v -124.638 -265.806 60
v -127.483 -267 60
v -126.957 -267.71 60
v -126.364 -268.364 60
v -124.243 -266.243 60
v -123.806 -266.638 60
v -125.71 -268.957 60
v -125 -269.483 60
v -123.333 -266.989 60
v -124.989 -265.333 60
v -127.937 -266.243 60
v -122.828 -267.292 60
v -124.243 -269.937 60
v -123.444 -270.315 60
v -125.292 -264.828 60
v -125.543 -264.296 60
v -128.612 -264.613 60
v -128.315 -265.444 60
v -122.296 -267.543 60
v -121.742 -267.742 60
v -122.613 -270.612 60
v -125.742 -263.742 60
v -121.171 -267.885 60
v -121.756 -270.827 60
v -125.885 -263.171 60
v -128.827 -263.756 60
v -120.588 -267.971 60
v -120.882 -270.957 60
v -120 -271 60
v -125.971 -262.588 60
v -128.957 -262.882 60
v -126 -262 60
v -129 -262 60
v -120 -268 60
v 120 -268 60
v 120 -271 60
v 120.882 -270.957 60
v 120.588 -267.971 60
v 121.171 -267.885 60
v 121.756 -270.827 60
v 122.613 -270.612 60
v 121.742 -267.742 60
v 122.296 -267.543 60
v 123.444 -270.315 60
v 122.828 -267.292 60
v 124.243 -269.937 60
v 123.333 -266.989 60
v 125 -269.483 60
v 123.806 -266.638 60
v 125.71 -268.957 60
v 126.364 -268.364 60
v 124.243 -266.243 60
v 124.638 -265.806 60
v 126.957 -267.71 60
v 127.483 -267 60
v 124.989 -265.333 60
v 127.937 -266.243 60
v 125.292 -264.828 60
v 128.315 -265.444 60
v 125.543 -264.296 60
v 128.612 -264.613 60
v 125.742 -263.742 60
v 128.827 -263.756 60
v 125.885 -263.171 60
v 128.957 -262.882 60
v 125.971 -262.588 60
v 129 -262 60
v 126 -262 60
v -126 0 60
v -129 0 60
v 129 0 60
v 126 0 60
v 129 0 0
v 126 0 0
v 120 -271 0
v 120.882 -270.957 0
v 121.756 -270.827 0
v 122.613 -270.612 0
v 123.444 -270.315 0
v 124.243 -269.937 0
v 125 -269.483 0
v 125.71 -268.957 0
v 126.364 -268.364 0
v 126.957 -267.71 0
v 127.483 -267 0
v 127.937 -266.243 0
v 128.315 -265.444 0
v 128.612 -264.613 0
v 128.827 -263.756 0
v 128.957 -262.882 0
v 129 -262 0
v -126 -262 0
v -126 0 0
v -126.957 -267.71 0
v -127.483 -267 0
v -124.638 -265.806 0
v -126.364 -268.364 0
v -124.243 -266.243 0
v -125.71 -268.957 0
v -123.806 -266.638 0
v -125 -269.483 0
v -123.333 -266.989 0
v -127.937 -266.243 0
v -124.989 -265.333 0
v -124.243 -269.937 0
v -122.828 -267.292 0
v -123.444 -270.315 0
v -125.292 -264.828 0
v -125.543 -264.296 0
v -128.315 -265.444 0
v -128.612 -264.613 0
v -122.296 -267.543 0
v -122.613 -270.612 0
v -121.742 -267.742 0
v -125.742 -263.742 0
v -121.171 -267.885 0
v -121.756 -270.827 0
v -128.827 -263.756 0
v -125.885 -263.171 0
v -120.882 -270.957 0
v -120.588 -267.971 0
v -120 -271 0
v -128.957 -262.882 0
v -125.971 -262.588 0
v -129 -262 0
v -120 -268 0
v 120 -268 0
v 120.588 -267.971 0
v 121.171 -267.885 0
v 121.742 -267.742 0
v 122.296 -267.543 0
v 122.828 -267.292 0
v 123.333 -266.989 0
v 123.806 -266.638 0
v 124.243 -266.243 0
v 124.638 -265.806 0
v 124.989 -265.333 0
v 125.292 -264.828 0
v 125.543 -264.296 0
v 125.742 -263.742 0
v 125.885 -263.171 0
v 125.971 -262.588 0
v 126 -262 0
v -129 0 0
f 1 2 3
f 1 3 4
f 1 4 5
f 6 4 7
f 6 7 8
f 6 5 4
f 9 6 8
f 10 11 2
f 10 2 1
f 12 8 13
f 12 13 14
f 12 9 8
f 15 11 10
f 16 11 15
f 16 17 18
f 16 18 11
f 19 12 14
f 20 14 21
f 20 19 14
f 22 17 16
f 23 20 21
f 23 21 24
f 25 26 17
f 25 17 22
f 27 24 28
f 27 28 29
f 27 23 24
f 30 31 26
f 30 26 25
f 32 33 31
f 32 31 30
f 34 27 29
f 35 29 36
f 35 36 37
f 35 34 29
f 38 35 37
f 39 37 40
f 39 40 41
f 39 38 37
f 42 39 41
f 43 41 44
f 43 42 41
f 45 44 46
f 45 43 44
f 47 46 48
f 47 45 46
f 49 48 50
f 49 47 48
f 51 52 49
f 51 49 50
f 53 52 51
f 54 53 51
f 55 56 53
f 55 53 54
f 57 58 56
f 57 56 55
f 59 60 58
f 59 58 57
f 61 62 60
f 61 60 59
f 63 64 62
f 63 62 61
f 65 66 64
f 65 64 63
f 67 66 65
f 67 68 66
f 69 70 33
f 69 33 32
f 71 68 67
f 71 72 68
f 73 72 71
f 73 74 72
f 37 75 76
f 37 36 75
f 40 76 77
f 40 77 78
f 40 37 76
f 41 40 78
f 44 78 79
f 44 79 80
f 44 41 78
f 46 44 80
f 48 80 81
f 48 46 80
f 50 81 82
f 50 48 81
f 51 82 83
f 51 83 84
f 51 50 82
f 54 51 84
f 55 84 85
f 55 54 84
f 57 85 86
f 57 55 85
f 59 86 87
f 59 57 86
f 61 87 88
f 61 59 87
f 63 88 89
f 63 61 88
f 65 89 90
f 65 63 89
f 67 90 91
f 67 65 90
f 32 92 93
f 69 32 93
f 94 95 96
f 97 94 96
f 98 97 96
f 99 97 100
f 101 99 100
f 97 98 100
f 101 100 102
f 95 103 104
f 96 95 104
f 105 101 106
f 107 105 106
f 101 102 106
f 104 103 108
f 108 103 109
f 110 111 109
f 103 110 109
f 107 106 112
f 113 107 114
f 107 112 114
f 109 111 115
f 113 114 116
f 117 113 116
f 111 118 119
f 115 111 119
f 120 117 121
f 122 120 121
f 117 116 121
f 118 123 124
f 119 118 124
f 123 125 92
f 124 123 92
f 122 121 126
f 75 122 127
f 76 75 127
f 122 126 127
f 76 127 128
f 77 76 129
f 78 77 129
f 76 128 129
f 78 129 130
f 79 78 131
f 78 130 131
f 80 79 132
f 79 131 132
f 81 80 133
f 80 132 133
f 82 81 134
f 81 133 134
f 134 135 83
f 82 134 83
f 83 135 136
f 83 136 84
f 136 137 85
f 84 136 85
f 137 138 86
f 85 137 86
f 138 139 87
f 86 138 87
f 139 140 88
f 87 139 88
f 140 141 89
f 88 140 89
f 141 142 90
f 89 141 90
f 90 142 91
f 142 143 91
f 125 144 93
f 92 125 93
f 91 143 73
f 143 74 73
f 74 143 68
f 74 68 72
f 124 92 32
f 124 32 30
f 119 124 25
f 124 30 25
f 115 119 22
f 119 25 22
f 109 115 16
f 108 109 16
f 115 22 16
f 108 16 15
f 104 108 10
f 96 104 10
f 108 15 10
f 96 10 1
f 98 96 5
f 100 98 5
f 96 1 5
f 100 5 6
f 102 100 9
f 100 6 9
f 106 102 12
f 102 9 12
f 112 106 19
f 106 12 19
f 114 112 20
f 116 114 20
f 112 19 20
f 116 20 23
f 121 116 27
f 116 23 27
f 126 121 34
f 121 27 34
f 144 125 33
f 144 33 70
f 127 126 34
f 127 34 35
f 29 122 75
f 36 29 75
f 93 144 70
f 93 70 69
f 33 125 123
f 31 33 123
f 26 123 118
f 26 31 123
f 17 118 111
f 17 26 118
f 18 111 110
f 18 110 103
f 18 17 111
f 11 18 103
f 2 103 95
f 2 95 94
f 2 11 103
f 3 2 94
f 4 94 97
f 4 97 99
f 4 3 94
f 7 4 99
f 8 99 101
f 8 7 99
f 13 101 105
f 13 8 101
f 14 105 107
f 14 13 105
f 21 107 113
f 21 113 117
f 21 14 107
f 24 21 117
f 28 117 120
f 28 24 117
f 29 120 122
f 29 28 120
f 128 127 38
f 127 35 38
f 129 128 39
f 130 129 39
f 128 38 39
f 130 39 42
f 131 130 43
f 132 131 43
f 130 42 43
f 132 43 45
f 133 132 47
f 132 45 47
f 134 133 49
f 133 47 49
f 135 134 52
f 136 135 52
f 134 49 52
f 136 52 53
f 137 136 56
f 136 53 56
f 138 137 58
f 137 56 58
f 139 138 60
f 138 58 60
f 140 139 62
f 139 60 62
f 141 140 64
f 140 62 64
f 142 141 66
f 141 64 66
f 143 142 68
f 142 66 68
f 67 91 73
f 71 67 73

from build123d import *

# Parameters (mm, degrees)
SKETCH040_W    = 252
SKETCH040_H    = 268
PAD011_DEPTH   = 60
FILLET013_R    = 6
THICKNESS001_T = 3


with BuildPart() as part:
    # Sketch040 → Pad011 (new body)
    with BuildSketch(Plane.XY):
        with Locations((0, -134)):
            Rectangle(SKETCH040_W, SKETCH040_H)
    extrude(amount=PAD011_DEPTH)

    # Fillet013
    fillet013_edges = [part.edges().sort_by_distance(p)[0] for p in [
        (126, -268, 30),
        (-126, -268, 30),
    ]]
    fillet(fillet013_edges, radius=FILLET013_R)

    # Thickness001
    thickness001_openings = [part.faces().sort_by_distance(p)[0] for p in [
        (0, -133.969642, 60),
        (0, -133.969642, 0),
        (0, 0, 30),
    ]]
    offset(amount=THICKNESS001_T, openings=thickness001_openings)


solid = part.part
